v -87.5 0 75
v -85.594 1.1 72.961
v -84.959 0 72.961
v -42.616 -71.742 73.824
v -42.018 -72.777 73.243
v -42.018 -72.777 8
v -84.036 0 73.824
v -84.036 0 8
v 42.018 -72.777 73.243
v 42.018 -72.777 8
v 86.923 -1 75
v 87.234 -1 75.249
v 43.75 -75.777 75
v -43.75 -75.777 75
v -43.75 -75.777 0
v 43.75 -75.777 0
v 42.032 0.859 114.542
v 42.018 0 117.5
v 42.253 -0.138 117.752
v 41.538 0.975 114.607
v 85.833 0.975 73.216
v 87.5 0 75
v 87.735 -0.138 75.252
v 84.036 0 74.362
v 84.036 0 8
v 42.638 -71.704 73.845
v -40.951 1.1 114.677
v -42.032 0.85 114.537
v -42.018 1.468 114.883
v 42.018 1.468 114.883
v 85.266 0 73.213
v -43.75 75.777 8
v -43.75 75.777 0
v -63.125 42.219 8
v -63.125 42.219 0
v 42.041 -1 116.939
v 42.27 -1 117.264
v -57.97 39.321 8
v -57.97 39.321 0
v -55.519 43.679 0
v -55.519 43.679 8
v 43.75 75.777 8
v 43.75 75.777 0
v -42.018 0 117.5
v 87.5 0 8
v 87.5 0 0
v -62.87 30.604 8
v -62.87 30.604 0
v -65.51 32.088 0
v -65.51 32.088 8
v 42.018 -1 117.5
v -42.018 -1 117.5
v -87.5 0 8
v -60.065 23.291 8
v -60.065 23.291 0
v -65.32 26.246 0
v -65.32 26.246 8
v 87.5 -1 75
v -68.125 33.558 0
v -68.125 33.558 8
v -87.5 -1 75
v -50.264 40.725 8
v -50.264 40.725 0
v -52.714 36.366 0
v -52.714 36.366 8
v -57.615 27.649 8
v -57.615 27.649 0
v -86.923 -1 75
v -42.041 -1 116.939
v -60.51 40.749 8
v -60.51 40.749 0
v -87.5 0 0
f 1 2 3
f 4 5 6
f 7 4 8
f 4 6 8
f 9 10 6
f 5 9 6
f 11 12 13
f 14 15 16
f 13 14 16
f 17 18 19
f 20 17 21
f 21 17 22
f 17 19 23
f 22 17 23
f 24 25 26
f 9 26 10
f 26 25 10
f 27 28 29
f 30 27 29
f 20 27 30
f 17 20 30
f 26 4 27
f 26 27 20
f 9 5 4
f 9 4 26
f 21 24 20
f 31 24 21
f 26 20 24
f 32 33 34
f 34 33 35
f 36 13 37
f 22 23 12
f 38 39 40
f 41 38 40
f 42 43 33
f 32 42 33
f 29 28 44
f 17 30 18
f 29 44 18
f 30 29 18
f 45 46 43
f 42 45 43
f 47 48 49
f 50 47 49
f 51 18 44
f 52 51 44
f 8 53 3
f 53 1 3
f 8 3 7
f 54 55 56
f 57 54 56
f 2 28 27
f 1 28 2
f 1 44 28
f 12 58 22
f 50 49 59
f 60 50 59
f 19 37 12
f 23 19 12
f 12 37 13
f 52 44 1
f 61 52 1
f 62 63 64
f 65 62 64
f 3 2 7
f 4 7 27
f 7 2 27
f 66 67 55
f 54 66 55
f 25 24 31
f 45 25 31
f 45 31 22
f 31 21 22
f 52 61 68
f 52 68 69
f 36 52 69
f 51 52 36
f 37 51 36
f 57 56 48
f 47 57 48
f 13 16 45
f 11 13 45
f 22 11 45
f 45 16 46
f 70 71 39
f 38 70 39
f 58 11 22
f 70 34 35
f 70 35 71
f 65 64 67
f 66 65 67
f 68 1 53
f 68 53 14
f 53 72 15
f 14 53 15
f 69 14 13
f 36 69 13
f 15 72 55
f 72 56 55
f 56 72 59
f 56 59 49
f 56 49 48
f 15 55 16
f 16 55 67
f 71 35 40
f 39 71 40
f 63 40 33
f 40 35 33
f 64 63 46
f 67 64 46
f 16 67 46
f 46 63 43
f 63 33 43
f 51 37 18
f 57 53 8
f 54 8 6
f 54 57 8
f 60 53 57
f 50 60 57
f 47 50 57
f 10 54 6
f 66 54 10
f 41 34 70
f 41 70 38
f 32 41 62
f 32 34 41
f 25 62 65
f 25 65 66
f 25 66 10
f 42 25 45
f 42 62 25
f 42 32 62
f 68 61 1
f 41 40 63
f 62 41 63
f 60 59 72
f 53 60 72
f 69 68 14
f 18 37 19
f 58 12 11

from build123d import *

# Parameters (mm, degrees)
F0_W      = 50
F0_H      = 12.5
F1_DEPTH  = 8
F2_DEPTH  = 75
F4_DEPTH  = 8
F7_DEPTH  = 3
F8_DEPTH  = 1
F11_DEPTH = 3
F14_DEPTH = 3
F15_DEPTH = 8
F16_DEPTH = 25
F17_DEPTH = 8


# Not quite as in the source:
# - a feature names something its author has since deleted; it is built from what else it names


with BuildPart() as f1:
    # F0 (on Top) → F1 (new body)
    with BuildSketch(Plane.XY):
        Polygon((-42.0179491924, 72.7772228311), (-60.5095952989, 40.7487522591), (-57.9695070384, 39.3207329262), (-55.5194165334, 43.6791064608), (-50.2642610162, 40.7248836223), (-52.7144317239, 36.366367418), (-57.615009792, 27.6494680496), (-60.0654171506, 23.2910848888), (-65.3204122546, 26.2455930623), (-62.870004896, 30.6039762231), (-65.5097997054, 32.0881441788), (-84.0358983849, 0), (-42.0179491924, -72.7772228311), (42.0179491924, -72.7772228311), (84.0358983849, 0), (42.0179491924, 72.7772228311), align=None)
        with Locations((0, 54.5829171234)):
            Rectangle(F0_W, F0_H, mode=Mode.SUBTRACT)
    extrude(amount=F1_DEPTH)

    # F0 (on Top) → F2 (join)
    with BuildSketch(Plane.XY):
        Polygon((43.75, -75.7772228311), (87.5, 0), (84.0358983849, 0), (42.0179491924, -72.7772228311), (-42.0179491924, -72.7772228311), (-84.0358983849, 0), (-87.5, 0), (-43.75, -75.7772228311), align=None)
    extrude(amount=F2_DEPTH)

    # F0 (on Top) → F4 (join)
    with BuildSketch(Plane.XY):
        Polygon((43.75, 75.7772228311), (-43.75, 75.7772228311), (-63.1248363216, 42.2190219338), (-60.5095952989, 40.7487522591), (-42.0179491924, 72.7772228311), (42.0179491924, 72.7772228311), (84.0358983849, 0), (87.5, 0), align=None)
    extrude(amount=F4_DEPTH)

    # F6 (on face) → F7 (join)
    with BuildSketch(Plane(origin=(0, -50.1312366318, 89.3836679776), x_dir=(1, 0, 0), z_dir=(0, 0.4891706574, -0.872188092))):
        Polygon((43.75, 29.4041920927), (0, 29.4041920927), (-43.75, 29.4041920927), (-42.01795, -57.4775522498), (42.01795, -57.4775522498), align=None)
    extrude(amount=F7_DEPTH)

    # F3 (on Front) → F8 (join)
    with BuildSketch(Plane.XZ):
        Polygon((-42.01795, 114.5), (0, 114.5), (42.01795, 114.5), (84.0359, 75), (87.5, 75), (42.01795, 117.5), (0, 117.5), (-42.01795, 117.5), (-87.5, 75), (-84.0359, 75), align=None)
    extrude(amount=F8_DEPTH)

    # F10 (on face) → F11 (join)
    with BuildSketch(Plane(origin=(-67.6846727043, -39.0777640058, 72.4338274863), x_dir=(0.7723629594, -0.3015876344, 0.5590173143), z_dir=(-0.6351814378, -0.3667221741, 0.6797495039))):
        Polygon((33.2314262259, 55.789645187), (-25.6554603702, 35.6104118215), (30.9888924807, -31.0804218073), align=None)
    extrude(amount=-F11_DEPTH)

    # F13 (on face) → F14 (join)
    with BuildSketch(Plane(origin=(67.6756688636, -39.5950852503, 72.4241918832), x_dir=(0.7733047167, 0.3041472681, -0.556322078), z_dir=(-0.6340345536, 0.3709553614, -0.6785221475))):
        Polygon((-30.939509805, 30.5117392321), (-32.8751652468, -56.3649154418), (25.9400068576, -35.9776056011), align=None)
    extrude(amount=F14_DEPTH)

    # F0 (on Top) → F15 (join)
    with BuildSketch(Plane.XY):
        with Locations((0, 54.5829171234)):
            Rectangle(F0_W, F0_H)
    extrude(amount=F15_DEPTH)

    # F0 (on Top) → F16 (cut)
    with BuildSketch(Plane.XY):
        Polygon((-57.9695070384, 39.3207329262), (-60.5095952989, 40.7487522591), (-65.5097997054, 32.0881441788), (-62.870004896, 30.6039762231), (-57.615009792, 27.6494680496), (-52.7144317239, 36.366367418), align=None)
    extrude(amount=-F16_DEPTH, mode=Mode.SUBTRACT)

    # F0 (on Top) → F17 (join)
    with BuildSketch(Plane.XY):
        Polygon((-65.5097997054, 32.0881441788), (-68.125, 33.5584843966), (-87.5, 0), (-84.0358983849, 0), align=None)
    extrude(amount=F17_DEPTH)


solid = f1.part
